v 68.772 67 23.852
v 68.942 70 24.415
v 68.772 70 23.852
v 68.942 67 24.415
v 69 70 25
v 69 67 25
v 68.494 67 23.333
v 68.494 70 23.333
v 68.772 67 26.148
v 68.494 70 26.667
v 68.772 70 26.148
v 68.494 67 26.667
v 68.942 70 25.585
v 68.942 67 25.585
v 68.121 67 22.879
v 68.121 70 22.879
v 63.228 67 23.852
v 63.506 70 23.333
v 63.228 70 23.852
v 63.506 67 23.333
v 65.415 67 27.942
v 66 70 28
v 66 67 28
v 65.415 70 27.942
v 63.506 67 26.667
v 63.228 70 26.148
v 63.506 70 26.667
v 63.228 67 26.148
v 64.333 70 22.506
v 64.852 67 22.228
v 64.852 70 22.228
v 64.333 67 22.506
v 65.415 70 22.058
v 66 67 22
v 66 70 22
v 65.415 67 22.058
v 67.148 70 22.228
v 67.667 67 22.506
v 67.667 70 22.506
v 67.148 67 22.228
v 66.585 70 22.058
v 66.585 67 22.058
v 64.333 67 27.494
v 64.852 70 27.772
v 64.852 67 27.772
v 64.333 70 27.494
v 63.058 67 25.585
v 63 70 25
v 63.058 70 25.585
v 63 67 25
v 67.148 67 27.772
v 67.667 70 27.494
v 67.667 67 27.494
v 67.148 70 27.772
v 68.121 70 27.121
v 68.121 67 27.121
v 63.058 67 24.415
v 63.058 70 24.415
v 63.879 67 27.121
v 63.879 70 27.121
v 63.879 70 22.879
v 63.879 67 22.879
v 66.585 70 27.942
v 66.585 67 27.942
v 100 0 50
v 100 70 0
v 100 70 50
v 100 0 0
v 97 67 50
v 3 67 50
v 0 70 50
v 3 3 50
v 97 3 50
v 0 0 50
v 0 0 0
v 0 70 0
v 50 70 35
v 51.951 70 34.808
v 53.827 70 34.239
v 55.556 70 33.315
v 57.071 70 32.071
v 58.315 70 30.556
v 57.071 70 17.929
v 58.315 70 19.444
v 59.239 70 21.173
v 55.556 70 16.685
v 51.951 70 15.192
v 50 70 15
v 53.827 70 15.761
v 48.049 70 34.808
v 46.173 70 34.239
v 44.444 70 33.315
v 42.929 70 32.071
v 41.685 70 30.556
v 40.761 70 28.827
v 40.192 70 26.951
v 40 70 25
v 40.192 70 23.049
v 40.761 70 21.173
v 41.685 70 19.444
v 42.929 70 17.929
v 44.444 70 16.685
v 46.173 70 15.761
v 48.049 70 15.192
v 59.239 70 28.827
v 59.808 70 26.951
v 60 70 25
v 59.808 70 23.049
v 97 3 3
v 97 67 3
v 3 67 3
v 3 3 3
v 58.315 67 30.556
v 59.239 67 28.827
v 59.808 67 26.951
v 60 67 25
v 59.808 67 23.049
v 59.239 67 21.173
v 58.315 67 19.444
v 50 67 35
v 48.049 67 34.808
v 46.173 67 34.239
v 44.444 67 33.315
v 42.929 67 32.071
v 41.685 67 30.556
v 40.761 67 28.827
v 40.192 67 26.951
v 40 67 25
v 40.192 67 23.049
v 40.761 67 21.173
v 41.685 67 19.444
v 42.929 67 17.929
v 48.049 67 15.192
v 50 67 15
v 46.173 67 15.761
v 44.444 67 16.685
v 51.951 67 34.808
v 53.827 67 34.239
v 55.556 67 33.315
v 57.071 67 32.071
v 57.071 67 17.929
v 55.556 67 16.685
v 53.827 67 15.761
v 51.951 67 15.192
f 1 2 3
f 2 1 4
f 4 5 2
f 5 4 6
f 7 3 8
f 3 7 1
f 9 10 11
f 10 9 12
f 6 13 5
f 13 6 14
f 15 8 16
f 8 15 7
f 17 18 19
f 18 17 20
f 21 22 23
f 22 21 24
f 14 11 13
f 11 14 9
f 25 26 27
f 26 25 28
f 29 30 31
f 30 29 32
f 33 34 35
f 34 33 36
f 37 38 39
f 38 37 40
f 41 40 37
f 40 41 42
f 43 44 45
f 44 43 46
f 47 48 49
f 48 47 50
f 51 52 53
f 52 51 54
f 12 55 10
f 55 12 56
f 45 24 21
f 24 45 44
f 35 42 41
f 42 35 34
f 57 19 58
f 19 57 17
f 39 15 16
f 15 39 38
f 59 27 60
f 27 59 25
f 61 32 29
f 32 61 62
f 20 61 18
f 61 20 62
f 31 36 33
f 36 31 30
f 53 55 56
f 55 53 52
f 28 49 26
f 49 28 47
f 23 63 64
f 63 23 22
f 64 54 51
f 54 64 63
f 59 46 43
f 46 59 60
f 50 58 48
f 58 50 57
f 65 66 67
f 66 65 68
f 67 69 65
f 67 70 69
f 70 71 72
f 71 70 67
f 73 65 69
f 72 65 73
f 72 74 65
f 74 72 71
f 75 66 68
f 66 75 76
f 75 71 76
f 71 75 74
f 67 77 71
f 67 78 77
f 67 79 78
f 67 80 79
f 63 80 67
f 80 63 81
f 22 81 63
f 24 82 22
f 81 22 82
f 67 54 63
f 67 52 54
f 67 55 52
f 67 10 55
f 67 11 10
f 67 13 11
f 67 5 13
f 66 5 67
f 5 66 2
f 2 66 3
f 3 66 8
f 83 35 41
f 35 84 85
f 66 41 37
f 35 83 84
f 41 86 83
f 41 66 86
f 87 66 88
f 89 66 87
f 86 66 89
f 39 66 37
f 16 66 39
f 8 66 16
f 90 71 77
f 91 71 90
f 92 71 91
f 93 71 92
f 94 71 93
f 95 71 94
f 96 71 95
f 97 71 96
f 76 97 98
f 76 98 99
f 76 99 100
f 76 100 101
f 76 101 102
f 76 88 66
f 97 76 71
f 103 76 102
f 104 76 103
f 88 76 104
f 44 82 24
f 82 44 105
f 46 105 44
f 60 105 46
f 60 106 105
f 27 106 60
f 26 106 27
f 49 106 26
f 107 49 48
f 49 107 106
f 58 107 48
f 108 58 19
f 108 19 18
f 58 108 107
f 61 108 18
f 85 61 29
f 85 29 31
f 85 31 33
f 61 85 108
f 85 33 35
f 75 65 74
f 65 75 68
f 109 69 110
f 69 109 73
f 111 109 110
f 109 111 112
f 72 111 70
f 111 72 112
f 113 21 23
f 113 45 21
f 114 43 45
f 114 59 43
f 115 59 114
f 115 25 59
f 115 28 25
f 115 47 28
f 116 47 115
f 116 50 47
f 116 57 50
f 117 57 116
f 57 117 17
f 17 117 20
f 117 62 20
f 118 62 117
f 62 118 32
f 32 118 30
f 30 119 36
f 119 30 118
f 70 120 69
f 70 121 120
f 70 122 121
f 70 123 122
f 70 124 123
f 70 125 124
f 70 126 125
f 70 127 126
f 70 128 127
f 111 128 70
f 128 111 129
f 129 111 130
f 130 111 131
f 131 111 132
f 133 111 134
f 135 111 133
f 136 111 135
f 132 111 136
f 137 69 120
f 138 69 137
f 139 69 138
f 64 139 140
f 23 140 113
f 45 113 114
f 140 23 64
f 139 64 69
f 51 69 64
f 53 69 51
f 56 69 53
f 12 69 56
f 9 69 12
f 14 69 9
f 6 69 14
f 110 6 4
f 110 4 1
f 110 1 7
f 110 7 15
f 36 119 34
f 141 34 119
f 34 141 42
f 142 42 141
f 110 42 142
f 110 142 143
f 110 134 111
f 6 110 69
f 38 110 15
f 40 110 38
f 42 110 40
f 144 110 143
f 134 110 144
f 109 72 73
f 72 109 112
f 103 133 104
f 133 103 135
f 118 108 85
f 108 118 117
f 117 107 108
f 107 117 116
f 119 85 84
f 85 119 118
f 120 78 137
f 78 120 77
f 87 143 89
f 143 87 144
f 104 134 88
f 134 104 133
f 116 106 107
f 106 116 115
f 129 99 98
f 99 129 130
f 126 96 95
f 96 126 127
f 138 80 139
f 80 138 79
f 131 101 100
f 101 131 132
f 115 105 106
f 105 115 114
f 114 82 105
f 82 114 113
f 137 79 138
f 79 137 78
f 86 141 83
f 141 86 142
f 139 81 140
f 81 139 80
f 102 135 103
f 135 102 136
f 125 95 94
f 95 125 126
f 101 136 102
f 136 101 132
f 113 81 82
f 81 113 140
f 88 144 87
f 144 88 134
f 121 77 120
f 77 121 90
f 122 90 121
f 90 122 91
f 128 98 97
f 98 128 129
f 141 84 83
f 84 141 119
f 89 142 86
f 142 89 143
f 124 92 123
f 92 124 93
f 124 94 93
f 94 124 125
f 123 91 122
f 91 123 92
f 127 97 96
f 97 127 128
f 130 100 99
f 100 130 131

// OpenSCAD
$fn = 32;

// ----------------------------------------------------------------------
// Vent box: roundvent enclosure
// ----------------------------------------------------------------------

// --- parameters (mm) ---
box_l = 100;              // box length, X
box_w = 70;               // box width, Y
box_h = 50;               // box height, Z
wall_t = 3;               // shell wall thickness
vent_d = 20;              // central vent diameter
ring_d = 6;               // ring hole diameter
n_ring = 6;               // holes in the ring
ring_r = 16;              // ring radius
fit_tol = 0.1;            // tolerance for press fits, mm
free_tol = 0.5;           // tolerance for clearance fits, mm

ring_step = 360 / n_ring;  // ring hole angular step

difference() {
  cube([box_l, box_w, box_h]);
  translate([wall_t, wall_t, wall_t])
    cube([box_l - 2 * wall_t, box_w - 2 * wall_t, box_h]);
  translate([box_l / 2, box_w - wall_t - 1, box_h / 2])
    rotate([-90, 0, 0]) cylinder(h = wall_t + 2, d = vent_d);
  for (i = [0 : n_ring - 1])
    translate([box_l / 2, box_w - wall_t - 1, box_h / 2])
      rotate([0, 0, i * ring_step])
        translate([ring_r, 0, 0]) rotate([-90, 0, 0])
          cylinder(h = wall_t + 2, d = ring_d);
}
